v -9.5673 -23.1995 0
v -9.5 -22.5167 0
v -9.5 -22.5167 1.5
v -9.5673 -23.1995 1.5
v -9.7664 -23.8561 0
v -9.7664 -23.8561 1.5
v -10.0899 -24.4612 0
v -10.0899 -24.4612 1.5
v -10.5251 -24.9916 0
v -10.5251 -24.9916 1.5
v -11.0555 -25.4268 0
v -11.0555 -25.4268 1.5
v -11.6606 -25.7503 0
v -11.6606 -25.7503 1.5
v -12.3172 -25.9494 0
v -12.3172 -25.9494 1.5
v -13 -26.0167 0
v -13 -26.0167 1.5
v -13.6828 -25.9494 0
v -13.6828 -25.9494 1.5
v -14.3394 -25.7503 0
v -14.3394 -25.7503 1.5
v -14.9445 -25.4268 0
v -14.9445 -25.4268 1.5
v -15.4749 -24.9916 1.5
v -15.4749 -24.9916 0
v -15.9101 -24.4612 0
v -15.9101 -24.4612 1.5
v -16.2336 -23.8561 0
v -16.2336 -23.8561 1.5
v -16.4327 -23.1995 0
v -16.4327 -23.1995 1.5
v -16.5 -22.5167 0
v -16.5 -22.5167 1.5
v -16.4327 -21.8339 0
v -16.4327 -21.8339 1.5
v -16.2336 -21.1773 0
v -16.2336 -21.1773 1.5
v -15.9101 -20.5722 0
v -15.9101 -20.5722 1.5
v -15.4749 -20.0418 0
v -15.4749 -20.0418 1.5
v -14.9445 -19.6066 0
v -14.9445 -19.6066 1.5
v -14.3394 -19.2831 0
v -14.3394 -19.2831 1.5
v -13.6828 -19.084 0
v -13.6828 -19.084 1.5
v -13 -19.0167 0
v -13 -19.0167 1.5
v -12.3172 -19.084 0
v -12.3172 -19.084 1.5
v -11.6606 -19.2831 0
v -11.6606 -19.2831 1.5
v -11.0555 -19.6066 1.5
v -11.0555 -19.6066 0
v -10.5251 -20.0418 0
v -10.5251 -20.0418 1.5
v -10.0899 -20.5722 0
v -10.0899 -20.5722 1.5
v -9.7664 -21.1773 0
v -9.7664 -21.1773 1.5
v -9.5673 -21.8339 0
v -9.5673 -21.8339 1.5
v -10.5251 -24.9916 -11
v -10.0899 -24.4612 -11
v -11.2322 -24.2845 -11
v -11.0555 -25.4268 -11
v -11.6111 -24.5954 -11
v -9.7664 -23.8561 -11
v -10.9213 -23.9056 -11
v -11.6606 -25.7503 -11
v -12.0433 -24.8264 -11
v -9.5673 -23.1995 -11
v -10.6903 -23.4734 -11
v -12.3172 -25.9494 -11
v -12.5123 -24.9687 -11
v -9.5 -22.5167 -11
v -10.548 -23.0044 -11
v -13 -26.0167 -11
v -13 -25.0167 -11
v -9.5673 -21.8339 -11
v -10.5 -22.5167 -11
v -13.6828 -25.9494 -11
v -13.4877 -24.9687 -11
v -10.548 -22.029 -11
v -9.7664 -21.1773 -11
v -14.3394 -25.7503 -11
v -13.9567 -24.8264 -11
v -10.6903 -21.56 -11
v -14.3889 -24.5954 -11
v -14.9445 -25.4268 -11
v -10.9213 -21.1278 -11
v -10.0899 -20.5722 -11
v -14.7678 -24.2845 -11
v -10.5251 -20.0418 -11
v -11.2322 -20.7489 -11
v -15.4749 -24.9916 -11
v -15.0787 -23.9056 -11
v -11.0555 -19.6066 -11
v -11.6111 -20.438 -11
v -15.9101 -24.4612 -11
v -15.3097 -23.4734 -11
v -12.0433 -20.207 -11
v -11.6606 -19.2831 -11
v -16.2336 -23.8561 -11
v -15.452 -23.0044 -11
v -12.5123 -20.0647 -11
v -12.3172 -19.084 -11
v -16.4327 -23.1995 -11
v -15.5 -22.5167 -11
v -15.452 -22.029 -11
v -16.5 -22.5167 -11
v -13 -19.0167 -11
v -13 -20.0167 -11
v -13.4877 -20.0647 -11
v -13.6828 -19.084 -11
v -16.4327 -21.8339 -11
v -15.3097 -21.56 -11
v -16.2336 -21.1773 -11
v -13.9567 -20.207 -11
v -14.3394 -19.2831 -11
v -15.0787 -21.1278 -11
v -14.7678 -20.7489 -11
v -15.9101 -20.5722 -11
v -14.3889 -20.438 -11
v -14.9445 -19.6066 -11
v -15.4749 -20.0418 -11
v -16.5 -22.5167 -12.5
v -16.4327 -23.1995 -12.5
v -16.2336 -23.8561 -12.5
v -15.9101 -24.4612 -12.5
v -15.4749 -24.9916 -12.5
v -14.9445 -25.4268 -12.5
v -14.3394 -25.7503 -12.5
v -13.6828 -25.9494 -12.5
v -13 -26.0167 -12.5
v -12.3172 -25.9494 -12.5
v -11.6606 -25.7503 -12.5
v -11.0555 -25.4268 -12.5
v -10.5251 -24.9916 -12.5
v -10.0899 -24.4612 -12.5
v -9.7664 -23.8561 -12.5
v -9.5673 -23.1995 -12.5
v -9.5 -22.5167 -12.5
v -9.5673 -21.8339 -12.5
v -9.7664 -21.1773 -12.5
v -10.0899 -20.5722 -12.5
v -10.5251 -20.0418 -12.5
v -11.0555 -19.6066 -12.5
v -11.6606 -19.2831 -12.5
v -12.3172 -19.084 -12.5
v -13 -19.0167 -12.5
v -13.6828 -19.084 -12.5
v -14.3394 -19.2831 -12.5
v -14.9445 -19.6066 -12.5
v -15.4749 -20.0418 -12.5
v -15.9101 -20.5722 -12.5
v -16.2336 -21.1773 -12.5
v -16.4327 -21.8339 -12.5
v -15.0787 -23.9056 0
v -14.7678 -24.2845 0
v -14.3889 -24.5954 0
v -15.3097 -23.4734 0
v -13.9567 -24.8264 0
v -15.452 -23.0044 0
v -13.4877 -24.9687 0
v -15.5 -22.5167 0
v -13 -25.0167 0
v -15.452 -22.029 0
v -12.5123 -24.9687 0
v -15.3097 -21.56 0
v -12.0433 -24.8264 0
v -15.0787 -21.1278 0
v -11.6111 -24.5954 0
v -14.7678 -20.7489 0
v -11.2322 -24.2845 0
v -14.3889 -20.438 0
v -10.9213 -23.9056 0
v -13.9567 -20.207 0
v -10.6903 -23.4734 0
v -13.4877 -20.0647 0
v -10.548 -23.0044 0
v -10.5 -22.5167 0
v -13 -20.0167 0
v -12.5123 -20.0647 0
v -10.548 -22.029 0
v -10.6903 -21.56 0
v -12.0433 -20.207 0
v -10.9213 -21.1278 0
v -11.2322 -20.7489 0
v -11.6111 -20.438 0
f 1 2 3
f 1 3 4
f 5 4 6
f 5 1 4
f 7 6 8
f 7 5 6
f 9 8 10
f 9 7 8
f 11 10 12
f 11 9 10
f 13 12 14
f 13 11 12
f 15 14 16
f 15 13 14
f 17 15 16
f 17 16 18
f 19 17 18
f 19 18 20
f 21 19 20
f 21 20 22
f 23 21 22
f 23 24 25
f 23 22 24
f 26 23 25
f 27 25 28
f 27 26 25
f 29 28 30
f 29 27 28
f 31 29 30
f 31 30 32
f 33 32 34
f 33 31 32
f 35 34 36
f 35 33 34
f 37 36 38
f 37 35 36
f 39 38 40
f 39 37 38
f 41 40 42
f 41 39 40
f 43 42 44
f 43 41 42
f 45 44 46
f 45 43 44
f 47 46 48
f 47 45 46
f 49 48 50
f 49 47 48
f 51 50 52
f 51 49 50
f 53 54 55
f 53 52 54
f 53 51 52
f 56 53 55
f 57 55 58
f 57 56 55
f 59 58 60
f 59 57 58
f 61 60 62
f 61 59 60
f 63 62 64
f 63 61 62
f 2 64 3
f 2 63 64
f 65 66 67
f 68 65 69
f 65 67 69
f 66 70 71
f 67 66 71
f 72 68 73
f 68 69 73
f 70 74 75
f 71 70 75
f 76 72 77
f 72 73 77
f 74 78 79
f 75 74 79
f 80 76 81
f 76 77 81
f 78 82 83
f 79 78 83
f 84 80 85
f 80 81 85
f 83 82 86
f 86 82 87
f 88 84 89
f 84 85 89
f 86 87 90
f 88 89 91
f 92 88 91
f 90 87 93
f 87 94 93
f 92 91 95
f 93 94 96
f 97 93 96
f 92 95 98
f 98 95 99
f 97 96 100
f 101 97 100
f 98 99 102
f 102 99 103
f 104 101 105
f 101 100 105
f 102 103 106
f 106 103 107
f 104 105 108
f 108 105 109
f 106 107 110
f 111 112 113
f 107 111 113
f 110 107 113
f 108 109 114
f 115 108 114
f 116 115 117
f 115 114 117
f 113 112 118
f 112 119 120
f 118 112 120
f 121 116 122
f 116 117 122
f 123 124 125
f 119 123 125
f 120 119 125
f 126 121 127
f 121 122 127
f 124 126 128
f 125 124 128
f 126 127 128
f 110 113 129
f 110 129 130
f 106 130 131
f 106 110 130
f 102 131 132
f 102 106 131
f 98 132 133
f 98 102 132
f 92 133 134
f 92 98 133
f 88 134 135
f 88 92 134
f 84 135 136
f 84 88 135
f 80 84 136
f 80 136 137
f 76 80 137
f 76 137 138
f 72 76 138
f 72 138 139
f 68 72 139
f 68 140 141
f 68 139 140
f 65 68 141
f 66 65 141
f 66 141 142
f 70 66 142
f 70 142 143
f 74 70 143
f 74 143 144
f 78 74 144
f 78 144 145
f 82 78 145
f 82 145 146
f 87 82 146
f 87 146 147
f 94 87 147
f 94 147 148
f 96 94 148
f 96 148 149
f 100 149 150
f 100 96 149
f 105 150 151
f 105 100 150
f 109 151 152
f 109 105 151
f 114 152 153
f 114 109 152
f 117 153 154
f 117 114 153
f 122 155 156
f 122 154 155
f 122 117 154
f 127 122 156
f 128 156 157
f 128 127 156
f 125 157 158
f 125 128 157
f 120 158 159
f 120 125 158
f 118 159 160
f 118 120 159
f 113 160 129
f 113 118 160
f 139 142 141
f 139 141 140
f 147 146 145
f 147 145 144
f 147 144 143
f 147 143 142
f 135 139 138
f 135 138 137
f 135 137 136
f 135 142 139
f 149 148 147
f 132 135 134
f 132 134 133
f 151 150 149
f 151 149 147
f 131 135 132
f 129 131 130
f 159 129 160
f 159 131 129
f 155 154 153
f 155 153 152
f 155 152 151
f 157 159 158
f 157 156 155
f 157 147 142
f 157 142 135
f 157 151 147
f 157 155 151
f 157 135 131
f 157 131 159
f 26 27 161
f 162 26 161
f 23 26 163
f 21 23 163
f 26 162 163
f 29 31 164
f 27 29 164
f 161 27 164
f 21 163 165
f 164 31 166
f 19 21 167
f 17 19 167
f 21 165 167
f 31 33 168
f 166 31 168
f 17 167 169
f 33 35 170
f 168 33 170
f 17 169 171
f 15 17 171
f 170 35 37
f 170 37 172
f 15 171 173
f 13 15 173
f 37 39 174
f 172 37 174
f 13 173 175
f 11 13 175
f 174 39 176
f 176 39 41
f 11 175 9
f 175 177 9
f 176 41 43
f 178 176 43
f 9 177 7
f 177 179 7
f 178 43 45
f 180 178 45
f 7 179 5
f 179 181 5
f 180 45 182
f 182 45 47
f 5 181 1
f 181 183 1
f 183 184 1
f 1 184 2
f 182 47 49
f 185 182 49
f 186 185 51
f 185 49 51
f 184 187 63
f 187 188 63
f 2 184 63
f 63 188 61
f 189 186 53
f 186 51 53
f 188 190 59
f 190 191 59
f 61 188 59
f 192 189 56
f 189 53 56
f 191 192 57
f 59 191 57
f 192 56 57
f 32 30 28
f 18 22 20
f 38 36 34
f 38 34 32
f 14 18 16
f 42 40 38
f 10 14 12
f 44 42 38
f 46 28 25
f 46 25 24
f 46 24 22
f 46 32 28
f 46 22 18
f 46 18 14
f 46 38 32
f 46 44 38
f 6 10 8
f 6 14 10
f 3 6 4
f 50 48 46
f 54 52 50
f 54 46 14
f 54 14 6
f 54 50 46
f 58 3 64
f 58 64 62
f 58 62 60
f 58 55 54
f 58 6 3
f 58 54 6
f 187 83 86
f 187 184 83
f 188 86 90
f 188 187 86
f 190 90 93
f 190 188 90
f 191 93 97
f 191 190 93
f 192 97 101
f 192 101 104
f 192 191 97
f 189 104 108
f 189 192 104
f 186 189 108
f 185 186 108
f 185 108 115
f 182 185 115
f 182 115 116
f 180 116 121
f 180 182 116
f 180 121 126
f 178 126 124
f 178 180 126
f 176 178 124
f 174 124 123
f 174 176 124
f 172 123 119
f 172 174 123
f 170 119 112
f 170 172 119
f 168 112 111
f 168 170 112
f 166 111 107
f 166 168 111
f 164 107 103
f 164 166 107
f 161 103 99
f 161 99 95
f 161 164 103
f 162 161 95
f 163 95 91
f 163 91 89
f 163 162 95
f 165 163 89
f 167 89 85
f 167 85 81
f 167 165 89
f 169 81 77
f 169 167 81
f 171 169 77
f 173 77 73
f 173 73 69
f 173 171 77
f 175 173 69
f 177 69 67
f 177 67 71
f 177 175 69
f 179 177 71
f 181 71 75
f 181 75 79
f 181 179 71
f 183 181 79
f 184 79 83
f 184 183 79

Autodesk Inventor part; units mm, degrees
ref_plane "YZ Plane" through (0, 0, 0) normal (1, 0, 0) x (0, 1, 0)
ref_plane "XZ Plane" through (0, 0, 0) normal (0, 1, 0) x (-1, 0, 0)
ref_plane "Płaszczyzna konstrukcyjna1" through (0, 0, 0) normal (0, 0, 1) x (1, 0, 0)
sketch "Szkic1" plane through (0, 0, 0) normal (0, 0, 1) x (1, 0, 0)
  circle A0 centre (-13, -22.5167) radius 2.5 projected
  circle A1 centre (-13, -22.5167) radius 2.5
  point P0 (0, 0)
extrude "Wyciągnięcie proste1" add sketch "Szkic1" against normal blind 11
sketch "Szkic2" plane through (-13, -22.5167, -11) normal (0, 0, -1) x (-1, 0, 0)
  circle A0 centre (0, 0) radius 2.5 projected
  circle A1 centre (0, 0) radius 3.5
  point P0 (-13, 22.5167)
  dimension "d2" = 7
extrude "Wyciągnięcie proste2" add sketch "Szkic2" along normal blind 1.5 contours A0 | A1
sketch "Szkic3" plane through (-13, -22.5167, 0) normal (0, 0, 1) x (1, 0, 0)
  circle A0 centre (0, 0) radius 3.5
  point P0 (13, 22.5167)
  dimension "d5" = 7
extrude "Wyciągnięcie proste3" add sketch "Szkic3" along normal blind 1.5
properties part number "Nit tarczy długi" material "Stal, węglowa"
